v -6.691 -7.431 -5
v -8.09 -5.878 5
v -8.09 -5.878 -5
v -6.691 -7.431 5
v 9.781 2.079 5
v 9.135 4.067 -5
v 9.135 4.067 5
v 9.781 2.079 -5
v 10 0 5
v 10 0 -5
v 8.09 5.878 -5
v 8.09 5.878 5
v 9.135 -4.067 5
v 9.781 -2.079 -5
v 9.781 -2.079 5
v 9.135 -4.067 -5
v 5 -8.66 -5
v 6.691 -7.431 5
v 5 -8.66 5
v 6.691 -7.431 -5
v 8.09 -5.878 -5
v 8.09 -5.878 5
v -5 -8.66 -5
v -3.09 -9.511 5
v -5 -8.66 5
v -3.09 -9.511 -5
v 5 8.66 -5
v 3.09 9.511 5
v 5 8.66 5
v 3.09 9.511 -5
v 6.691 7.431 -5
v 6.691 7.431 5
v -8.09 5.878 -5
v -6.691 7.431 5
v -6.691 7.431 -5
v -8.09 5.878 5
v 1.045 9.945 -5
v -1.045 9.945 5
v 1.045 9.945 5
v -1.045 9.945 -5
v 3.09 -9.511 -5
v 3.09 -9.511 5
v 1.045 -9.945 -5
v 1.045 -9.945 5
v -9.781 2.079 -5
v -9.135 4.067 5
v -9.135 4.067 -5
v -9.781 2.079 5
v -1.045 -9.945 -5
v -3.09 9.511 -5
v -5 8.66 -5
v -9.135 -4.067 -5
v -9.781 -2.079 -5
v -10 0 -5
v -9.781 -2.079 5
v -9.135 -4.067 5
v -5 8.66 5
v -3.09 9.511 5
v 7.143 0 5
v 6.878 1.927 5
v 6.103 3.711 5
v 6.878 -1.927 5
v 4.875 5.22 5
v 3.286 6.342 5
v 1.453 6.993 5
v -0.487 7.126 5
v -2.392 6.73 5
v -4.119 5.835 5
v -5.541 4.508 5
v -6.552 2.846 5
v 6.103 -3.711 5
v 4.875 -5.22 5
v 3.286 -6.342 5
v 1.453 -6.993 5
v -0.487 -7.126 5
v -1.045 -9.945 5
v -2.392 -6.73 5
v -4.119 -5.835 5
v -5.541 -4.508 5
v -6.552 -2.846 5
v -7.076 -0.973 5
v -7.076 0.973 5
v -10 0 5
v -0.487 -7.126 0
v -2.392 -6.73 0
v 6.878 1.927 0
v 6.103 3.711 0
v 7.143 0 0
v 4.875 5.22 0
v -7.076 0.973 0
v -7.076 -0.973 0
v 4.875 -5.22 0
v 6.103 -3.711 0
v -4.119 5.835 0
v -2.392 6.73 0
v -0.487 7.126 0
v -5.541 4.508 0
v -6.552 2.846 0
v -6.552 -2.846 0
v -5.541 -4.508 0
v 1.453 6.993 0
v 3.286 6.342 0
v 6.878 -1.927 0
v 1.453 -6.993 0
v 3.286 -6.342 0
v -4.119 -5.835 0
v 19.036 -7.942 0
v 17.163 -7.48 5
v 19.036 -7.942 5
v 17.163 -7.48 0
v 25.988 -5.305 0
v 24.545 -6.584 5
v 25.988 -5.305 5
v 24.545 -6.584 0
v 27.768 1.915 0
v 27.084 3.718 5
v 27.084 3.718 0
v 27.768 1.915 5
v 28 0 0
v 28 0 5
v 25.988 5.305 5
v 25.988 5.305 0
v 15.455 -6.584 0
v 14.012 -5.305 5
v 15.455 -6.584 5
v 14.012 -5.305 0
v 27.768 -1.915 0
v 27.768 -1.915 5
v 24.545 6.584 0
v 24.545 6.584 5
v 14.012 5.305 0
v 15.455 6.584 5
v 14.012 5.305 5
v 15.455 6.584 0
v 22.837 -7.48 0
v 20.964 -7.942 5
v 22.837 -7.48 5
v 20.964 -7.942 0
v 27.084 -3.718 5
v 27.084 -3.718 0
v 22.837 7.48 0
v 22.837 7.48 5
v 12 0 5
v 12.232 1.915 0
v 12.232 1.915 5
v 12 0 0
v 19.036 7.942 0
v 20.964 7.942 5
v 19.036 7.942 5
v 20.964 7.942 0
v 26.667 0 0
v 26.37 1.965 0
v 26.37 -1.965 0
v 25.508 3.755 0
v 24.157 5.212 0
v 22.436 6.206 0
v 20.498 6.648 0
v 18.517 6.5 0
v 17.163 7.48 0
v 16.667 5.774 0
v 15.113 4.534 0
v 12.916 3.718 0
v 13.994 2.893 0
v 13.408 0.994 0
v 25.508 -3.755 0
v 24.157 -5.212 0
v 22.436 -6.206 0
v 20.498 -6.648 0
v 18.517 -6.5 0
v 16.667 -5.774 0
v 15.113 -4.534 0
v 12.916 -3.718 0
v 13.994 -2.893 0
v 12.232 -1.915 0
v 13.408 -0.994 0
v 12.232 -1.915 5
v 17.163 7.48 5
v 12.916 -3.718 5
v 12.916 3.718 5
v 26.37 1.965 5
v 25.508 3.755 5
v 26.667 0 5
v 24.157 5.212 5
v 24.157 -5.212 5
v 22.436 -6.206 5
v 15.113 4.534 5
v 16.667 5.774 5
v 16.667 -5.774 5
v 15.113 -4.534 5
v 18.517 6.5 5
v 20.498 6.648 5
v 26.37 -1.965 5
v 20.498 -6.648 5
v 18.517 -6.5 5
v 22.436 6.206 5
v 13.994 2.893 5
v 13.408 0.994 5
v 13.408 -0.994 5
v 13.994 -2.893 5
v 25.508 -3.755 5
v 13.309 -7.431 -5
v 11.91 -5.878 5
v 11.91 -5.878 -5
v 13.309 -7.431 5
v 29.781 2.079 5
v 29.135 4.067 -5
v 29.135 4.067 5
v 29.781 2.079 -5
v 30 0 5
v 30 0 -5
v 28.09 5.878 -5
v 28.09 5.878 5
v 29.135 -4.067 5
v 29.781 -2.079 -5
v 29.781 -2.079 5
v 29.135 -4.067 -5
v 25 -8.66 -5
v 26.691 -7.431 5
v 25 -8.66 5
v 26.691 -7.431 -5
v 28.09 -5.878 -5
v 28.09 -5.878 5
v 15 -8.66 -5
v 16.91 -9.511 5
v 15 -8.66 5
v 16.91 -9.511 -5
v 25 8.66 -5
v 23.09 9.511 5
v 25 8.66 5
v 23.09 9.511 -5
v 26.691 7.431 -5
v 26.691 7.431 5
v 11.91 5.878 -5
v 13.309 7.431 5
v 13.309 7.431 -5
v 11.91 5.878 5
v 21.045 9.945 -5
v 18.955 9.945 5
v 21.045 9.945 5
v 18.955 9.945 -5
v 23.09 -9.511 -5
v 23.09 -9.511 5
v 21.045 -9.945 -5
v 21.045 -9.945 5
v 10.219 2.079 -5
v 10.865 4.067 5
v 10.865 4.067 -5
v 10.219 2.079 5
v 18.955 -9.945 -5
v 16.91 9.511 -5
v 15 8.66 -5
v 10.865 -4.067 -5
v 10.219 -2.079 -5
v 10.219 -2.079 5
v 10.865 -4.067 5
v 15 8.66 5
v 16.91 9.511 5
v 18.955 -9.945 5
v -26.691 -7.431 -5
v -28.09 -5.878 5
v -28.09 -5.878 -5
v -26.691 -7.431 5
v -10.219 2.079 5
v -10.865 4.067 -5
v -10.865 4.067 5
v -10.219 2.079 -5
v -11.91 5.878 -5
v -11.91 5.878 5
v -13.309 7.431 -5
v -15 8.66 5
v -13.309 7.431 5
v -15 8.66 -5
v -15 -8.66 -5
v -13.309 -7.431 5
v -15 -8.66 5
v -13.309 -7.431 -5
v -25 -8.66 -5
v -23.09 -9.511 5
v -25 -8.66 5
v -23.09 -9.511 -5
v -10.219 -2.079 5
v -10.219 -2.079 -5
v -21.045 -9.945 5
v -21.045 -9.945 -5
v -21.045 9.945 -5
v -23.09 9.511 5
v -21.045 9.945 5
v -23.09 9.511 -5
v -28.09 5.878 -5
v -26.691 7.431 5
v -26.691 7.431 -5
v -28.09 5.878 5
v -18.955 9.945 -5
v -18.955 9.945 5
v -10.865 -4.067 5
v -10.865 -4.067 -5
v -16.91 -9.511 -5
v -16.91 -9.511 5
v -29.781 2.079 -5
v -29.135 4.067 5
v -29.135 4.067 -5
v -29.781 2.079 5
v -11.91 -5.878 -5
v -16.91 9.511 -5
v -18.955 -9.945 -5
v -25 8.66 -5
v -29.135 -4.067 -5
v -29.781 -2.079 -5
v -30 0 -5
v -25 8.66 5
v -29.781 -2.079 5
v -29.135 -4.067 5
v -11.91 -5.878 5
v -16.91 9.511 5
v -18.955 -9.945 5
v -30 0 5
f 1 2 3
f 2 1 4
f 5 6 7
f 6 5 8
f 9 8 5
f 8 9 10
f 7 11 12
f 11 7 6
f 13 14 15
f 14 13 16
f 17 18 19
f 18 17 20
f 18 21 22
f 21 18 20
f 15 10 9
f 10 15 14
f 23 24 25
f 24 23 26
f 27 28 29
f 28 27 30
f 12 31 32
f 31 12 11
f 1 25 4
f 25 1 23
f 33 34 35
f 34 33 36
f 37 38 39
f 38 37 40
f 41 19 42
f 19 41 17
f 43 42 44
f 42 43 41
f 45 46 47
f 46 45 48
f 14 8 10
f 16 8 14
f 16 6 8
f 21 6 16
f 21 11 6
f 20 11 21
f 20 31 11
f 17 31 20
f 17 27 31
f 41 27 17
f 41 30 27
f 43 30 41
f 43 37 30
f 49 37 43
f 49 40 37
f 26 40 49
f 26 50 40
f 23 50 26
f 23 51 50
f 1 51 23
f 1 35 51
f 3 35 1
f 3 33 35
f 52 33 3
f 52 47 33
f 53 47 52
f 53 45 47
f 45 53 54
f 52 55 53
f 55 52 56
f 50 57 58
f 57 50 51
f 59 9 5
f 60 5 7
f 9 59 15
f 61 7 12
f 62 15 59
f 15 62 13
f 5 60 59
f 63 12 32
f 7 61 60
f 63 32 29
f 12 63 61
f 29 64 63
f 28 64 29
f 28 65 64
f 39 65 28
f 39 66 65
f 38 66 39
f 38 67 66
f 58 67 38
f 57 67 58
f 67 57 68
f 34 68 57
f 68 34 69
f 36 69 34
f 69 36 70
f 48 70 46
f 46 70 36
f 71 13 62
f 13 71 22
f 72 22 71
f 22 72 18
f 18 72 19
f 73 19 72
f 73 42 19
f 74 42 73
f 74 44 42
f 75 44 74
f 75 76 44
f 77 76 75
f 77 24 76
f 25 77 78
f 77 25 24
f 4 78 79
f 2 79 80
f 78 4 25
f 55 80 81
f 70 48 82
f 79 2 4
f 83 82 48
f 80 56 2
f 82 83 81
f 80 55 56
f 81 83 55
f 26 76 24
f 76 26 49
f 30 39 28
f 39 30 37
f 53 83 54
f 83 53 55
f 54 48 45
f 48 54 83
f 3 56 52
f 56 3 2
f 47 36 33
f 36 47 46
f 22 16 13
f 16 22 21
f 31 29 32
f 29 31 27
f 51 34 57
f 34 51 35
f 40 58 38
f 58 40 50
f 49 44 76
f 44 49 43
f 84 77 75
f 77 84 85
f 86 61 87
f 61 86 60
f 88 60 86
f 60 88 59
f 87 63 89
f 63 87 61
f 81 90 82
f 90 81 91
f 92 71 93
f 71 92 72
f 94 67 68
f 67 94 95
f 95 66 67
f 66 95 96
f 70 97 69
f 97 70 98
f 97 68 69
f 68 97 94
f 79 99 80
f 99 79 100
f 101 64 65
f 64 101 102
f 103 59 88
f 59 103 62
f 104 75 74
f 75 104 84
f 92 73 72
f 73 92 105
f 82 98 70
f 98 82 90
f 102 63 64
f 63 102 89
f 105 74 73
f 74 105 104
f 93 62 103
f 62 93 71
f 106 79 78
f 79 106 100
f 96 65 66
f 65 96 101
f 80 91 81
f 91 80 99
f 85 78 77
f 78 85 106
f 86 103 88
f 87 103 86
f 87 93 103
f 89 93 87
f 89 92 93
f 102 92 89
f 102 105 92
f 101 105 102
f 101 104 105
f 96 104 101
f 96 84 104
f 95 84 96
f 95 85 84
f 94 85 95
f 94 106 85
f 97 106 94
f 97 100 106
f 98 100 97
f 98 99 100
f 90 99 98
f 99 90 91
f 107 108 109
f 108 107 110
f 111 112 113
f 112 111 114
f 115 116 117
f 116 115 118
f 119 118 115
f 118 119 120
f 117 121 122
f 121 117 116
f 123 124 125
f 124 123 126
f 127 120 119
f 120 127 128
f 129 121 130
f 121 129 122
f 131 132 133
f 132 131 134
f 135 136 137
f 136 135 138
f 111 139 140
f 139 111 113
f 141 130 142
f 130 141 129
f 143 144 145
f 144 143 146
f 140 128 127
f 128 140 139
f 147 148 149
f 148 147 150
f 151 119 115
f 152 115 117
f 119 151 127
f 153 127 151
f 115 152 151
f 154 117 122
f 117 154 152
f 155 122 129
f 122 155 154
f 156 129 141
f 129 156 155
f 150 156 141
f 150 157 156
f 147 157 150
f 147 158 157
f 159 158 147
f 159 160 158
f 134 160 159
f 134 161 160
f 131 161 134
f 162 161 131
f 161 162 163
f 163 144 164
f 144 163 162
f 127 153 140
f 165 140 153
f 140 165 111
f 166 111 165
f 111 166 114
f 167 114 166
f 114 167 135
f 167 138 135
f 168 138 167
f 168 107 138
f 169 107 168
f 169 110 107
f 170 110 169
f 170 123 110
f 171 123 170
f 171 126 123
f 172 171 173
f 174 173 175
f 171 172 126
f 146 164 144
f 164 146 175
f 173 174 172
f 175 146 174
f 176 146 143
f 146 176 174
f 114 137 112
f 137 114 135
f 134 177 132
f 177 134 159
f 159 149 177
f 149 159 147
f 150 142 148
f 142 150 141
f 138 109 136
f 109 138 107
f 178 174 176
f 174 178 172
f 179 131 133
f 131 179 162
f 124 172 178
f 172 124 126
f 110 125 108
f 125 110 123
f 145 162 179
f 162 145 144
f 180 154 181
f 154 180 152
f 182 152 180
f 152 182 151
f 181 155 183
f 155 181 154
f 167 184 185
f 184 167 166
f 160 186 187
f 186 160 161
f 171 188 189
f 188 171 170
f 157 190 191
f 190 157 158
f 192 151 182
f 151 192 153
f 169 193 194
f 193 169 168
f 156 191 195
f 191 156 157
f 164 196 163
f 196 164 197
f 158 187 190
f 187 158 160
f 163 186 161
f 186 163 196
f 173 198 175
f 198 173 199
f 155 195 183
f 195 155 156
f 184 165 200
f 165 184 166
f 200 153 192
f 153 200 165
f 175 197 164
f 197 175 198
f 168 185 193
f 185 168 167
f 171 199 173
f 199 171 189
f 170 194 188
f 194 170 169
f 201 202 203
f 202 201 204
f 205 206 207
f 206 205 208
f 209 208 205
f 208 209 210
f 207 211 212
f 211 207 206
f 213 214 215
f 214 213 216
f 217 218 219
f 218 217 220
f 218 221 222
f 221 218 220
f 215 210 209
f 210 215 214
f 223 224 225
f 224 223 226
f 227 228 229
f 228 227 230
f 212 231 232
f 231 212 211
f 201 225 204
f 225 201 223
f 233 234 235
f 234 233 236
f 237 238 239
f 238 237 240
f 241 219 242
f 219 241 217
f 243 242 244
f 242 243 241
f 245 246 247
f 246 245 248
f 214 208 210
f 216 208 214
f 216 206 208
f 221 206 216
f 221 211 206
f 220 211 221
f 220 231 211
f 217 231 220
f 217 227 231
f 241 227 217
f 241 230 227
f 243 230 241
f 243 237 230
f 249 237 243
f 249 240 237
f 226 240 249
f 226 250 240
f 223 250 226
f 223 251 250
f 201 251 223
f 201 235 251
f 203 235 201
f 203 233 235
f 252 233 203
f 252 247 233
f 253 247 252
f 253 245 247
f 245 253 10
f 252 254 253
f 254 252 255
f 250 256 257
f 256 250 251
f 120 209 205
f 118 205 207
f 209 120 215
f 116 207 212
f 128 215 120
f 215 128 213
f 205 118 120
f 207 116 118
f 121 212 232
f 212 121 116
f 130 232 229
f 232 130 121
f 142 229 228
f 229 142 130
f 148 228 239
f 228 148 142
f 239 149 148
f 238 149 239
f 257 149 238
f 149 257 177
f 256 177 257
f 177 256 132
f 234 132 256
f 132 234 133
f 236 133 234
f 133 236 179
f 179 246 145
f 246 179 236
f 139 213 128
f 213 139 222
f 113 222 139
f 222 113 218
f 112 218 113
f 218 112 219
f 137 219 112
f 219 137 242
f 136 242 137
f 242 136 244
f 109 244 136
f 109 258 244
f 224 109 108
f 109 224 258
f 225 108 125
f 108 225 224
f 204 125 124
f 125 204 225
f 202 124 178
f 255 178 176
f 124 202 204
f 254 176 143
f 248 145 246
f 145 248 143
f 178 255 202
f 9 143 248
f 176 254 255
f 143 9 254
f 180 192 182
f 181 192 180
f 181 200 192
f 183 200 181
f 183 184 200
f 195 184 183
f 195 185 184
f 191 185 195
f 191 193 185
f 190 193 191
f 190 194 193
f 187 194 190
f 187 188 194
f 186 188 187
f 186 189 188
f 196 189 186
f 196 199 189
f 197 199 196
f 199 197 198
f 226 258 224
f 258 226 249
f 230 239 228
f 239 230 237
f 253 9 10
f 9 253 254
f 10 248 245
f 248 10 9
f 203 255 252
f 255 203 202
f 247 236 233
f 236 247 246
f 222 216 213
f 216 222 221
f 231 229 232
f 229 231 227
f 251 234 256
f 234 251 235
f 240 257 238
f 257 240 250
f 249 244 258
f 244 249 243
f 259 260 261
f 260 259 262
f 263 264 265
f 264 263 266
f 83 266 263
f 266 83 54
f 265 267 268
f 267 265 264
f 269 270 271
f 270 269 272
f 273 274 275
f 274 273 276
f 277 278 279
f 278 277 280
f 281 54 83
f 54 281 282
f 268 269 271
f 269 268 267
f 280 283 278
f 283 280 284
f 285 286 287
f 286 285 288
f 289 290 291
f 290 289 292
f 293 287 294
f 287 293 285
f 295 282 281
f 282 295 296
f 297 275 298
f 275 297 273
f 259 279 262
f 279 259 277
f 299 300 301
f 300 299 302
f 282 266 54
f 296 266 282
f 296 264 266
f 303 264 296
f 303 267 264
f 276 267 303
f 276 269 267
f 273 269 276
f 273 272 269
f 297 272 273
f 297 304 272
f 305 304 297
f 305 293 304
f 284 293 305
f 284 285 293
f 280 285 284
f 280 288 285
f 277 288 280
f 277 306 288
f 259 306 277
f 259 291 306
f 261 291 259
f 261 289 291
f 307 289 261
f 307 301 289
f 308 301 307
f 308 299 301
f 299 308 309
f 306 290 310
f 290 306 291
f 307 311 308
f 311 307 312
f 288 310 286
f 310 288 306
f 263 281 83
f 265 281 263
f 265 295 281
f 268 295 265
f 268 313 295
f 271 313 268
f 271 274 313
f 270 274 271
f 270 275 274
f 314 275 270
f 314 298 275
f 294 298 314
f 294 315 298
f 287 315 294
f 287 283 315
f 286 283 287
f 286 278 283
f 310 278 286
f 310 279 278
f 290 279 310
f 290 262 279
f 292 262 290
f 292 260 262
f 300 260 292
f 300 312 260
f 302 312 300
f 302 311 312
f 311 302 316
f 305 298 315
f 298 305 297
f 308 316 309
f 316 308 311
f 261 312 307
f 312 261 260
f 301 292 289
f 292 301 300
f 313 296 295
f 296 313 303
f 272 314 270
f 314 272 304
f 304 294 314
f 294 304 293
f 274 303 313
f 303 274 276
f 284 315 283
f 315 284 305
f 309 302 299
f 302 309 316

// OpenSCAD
// file: wheels.scad
//wheel modules

module wheel1(wheel_width,wheel_radius) {
  cylinder(h=wheel_width,r=wheel_radius,center=true);
}

module wheel2(wheel_width,wheel_radius) {
  difference() {
    cylinder(h=wheel_width,r=wheel_radius,center=true);
    translate([0,0,wheel_width/2])
      cylinder(h=wheel_width,r=wheel_radius/1.4,center=true);
  }
}

module wheel3(wheel_width,wheel_radius) {
  difference() {
    cylinder(h=wheel_width,r=wheel_radius,center=true);
    translate([0,0,wheel_width/2])
      difference() {
      cylinder(h=wheel_width,r=wheel_radius/1.25,center=true);
      cylinder(h=wheel_width,r=wheel_radius/1.5,center=true);
    }
  }
}
// main file
include <wheels.scad>

width=10;
radius=10;
kerning=2;

translate([width*-kerning,0,0])
wheel1(width,radius);

wheel2(width,radius);

translate([width*kerning,0,0])
wheel3(width,radius);
